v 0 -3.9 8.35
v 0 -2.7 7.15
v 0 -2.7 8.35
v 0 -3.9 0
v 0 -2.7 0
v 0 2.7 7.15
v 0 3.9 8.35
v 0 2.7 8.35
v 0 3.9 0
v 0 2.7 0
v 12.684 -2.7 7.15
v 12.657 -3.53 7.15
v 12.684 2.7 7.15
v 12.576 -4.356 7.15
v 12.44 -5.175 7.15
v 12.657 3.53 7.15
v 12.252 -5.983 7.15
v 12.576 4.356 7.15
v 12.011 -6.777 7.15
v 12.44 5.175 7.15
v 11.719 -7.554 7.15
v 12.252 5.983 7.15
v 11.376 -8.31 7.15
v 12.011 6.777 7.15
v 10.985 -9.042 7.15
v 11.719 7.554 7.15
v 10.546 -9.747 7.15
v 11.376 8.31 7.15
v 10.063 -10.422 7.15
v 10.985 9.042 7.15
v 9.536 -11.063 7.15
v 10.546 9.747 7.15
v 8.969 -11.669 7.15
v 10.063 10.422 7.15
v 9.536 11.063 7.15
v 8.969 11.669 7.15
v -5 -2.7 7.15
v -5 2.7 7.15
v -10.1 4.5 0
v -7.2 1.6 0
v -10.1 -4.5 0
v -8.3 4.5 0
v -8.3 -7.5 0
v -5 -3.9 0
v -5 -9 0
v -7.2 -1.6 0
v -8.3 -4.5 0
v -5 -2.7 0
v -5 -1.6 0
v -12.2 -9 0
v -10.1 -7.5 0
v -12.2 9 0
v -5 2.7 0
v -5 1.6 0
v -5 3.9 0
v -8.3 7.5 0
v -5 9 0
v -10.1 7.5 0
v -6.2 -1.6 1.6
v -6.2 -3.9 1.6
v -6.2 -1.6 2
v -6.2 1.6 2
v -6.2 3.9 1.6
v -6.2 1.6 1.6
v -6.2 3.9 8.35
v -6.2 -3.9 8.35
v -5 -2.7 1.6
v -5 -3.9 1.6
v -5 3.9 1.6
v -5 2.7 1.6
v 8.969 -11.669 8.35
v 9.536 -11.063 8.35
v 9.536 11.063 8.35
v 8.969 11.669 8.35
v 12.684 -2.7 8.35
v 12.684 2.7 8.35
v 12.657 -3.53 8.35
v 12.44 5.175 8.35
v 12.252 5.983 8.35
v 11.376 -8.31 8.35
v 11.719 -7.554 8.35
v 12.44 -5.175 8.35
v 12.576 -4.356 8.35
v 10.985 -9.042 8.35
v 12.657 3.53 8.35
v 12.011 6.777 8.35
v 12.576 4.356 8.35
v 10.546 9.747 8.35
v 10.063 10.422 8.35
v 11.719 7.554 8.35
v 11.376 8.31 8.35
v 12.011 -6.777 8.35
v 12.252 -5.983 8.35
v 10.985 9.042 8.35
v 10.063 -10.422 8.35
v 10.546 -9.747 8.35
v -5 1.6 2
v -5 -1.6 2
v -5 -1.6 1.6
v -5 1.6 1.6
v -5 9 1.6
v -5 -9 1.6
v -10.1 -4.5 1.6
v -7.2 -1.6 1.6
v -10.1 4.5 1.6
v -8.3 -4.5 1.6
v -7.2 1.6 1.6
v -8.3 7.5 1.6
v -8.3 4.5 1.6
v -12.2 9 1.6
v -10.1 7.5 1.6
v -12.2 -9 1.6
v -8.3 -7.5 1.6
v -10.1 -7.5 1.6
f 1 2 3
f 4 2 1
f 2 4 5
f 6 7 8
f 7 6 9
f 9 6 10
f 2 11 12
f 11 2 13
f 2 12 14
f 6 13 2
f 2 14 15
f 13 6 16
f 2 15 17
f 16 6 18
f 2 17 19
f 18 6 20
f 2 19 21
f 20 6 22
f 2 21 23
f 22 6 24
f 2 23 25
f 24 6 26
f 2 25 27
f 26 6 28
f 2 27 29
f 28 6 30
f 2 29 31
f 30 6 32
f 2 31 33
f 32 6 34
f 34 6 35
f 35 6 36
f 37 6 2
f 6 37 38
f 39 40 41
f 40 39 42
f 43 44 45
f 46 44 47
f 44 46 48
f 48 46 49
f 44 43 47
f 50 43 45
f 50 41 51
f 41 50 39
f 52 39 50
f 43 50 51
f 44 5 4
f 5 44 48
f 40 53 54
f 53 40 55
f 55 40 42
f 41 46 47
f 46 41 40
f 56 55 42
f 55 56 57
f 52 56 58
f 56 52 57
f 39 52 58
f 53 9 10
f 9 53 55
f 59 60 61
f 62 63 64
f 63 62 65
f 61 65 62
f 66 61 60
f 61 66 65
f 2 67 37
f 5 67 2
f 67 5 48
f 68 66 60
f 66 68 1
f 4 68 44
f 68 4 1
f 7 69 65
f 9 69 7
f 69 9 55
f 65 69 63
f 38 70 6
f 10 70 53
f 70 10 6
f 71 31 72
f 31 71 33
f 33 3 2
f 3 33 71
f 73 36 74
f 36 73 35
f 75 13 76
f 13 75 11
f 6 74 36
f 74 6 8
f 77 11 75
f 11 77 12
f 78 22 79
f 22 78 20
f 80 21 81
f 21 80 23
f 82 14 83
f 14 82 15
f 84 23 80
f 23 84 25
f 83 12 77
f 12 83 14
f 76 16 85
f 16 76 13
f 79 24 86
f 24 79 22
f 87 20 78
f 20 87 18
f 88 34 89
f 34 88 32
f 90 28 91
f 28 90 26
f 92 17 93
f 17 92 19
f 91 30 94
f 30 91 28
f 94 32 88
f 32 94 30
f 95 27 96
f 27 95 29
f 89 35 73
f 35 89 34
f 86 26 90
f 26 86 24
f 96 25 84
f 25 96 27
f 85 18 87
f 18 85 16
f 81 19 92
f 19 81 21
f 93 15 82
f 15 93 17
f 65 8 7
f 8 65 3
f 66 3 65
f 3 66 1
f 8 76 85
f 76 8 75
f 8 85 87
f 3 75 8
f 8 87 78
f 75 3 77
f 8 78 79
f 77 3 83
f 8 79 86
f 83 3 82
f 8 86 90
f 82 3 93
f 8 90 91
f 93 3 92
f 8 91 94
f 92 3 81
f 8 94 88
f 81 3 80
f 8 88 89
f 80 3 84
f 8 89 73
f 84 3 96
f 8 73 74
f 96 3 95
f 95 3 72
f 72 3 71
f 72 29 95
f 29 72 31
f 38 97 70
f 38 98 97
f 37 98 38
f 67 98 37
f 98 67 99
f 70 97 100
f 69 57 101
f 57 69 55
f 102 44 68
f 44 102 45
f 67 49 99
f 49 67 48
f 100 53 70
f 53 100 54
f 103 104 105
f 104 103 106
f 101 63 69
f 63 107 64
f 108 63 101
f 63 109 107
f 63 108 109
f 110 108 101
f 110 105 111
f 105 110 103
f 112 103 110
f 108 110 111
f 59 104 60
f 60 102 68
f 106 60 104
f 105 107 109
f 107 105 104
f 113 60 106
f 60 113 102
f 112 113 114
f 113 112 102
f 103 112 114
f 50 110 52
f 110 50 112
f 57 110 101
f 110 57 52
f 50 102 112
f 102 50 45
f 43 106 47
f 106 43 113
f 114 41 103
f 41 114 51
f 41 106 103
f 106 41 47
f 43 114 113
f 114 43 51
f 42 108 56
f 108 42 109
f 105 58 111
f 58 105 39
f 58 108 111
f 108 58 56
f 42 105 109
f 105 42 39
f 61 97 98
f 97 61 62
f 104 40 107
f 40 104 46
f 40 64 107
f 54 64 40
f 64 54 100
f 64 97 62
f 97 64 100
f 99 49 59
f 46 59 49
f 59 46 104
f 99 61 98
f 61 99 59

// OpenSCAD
// Sun visor for one 38 kHz IR receiver module (TSOP38238 class, minicast
// package about 5.0 wide x 6.95 high). Source for the printable part; the
// dimensions and the reasoning are in docs/hardware.md, "Sun visors", and
// tools/visor_check.py reads the numbers below to check the shading.
//
// Axes: x forward (the receiver's axis), y sideways, z up. The receiver's
// front face is the plane x = 0, its bottom is z = 0, the leads go down.
//
// The brim is a flat roof over the face, longer than the face is high
// divided by tan(30 degrees), so every point of the face is in shadow from a
// sun more than 30 degrees above the horizon; it is widened by 45-degree
// fans on both sides so the shadow also holds for sun up to 45 degrees to
// the side. There are no side walls in front of the face and no tube, so
// the +-45 degree horizontal acceptance of the receiver is untouched.
//
// Print flat, roof up or on its back plate, 0.2 mm layers, 4 perimeters,
// opaque black PETG or ABS (check that your filament blocks 940 nm: bench
// check in docs/bench.md), then paint the inside matte black if it is shiny.

face_w   = 5.0;   // receiver width (datasheet)
face_h   = 6.95;  // receiver height (datasheet)
clear    = 0.2;   // clearance around the receiver
wall     = 1.2;   // wall and roof thickness
depth    = 5.0;   // pocket depth behind the face (module body)
cut_deg  = 30;    // elevations above this are shaded
side_deg = 45;    // horizontal acceptance kept on each side

win_w    = face_w + 2 * clear;          // pocket width
win_h    = face_h + clear;              // pocket height; roof sits on it
roof_len = win_h / tan(cut_deg) + 0.3;  // brim length forward of the face
half_w   = win_w / 2;                   // the fan starts at the face edges
roof_z   = win_h;                       // underside of the roof
tab_len  = 6;     // rear mounting tab
tab_w    = 18;
tab_t    = 1.6;
tie_w    = 3.0;   // zip-tie / thread slots in the tab
tie_l    = 1.8;

module fan(r, a) {
    // quarter-ish fan from 0 to a degrees, centred on the origin
    n = 12;
    polygon(concat([[0, 0]],
        [for (i = [0 : n]) [r * cos(a * i / n), r * sin(a * i / n)]]));
}

module roof2d() {
    hull() {
        translate([0,  half_w]) fan(roof_len, side_deg);
        translate([0, -half_w]) mirror([0, 1]) fan(roof_len, side_deg);
    }
}

module visor() {
    difference() {
        union() {
            // roof: the brim over the face and over the pocket behind it
            translate([0, 0, roof_z]) linear_extrude(wall) roof2d();
            translate([-depth - wall, -win_w / 2 - wall, roof_z])
                cube([depth + wall, win_w + 2 * wall, wall]);
            // back wall and side walls of the pocket (the face stays open)
            translate([-depth - wall, -win_w / 2 - wall, 0])
                cube([wall, win_w + 2 * wall, roof_z]);
            for (s = [-1, 1])
                translate([-depth - wall, s * (win_w / 2 + wall / 2) - wall / 2, 0])
                    cube([depth + wall, wall, roof_z]);
            // rear mounting tab
            translate([-depth - wall - tab_len, -tab_w / 2, 0])
                cube([tab_len + wall, tab_w, tab_t]);
        }
        // slots for a zip tie or thread through the tab
        for (s = [-1, 1])
            translate([-depth - wall - tab_len / 2 - tie_l / 2, s * (tab_w / 2 - 3) - tie_w / 2, -1])
                cube([tie_l, tie_w, tab_t + 2]);
        // lead notch in the back wall, low
        translate([-depth - wall - 1, -1.6, -1]) cube([wall + 2, 3.2, 3]);
    }
}

visor();
